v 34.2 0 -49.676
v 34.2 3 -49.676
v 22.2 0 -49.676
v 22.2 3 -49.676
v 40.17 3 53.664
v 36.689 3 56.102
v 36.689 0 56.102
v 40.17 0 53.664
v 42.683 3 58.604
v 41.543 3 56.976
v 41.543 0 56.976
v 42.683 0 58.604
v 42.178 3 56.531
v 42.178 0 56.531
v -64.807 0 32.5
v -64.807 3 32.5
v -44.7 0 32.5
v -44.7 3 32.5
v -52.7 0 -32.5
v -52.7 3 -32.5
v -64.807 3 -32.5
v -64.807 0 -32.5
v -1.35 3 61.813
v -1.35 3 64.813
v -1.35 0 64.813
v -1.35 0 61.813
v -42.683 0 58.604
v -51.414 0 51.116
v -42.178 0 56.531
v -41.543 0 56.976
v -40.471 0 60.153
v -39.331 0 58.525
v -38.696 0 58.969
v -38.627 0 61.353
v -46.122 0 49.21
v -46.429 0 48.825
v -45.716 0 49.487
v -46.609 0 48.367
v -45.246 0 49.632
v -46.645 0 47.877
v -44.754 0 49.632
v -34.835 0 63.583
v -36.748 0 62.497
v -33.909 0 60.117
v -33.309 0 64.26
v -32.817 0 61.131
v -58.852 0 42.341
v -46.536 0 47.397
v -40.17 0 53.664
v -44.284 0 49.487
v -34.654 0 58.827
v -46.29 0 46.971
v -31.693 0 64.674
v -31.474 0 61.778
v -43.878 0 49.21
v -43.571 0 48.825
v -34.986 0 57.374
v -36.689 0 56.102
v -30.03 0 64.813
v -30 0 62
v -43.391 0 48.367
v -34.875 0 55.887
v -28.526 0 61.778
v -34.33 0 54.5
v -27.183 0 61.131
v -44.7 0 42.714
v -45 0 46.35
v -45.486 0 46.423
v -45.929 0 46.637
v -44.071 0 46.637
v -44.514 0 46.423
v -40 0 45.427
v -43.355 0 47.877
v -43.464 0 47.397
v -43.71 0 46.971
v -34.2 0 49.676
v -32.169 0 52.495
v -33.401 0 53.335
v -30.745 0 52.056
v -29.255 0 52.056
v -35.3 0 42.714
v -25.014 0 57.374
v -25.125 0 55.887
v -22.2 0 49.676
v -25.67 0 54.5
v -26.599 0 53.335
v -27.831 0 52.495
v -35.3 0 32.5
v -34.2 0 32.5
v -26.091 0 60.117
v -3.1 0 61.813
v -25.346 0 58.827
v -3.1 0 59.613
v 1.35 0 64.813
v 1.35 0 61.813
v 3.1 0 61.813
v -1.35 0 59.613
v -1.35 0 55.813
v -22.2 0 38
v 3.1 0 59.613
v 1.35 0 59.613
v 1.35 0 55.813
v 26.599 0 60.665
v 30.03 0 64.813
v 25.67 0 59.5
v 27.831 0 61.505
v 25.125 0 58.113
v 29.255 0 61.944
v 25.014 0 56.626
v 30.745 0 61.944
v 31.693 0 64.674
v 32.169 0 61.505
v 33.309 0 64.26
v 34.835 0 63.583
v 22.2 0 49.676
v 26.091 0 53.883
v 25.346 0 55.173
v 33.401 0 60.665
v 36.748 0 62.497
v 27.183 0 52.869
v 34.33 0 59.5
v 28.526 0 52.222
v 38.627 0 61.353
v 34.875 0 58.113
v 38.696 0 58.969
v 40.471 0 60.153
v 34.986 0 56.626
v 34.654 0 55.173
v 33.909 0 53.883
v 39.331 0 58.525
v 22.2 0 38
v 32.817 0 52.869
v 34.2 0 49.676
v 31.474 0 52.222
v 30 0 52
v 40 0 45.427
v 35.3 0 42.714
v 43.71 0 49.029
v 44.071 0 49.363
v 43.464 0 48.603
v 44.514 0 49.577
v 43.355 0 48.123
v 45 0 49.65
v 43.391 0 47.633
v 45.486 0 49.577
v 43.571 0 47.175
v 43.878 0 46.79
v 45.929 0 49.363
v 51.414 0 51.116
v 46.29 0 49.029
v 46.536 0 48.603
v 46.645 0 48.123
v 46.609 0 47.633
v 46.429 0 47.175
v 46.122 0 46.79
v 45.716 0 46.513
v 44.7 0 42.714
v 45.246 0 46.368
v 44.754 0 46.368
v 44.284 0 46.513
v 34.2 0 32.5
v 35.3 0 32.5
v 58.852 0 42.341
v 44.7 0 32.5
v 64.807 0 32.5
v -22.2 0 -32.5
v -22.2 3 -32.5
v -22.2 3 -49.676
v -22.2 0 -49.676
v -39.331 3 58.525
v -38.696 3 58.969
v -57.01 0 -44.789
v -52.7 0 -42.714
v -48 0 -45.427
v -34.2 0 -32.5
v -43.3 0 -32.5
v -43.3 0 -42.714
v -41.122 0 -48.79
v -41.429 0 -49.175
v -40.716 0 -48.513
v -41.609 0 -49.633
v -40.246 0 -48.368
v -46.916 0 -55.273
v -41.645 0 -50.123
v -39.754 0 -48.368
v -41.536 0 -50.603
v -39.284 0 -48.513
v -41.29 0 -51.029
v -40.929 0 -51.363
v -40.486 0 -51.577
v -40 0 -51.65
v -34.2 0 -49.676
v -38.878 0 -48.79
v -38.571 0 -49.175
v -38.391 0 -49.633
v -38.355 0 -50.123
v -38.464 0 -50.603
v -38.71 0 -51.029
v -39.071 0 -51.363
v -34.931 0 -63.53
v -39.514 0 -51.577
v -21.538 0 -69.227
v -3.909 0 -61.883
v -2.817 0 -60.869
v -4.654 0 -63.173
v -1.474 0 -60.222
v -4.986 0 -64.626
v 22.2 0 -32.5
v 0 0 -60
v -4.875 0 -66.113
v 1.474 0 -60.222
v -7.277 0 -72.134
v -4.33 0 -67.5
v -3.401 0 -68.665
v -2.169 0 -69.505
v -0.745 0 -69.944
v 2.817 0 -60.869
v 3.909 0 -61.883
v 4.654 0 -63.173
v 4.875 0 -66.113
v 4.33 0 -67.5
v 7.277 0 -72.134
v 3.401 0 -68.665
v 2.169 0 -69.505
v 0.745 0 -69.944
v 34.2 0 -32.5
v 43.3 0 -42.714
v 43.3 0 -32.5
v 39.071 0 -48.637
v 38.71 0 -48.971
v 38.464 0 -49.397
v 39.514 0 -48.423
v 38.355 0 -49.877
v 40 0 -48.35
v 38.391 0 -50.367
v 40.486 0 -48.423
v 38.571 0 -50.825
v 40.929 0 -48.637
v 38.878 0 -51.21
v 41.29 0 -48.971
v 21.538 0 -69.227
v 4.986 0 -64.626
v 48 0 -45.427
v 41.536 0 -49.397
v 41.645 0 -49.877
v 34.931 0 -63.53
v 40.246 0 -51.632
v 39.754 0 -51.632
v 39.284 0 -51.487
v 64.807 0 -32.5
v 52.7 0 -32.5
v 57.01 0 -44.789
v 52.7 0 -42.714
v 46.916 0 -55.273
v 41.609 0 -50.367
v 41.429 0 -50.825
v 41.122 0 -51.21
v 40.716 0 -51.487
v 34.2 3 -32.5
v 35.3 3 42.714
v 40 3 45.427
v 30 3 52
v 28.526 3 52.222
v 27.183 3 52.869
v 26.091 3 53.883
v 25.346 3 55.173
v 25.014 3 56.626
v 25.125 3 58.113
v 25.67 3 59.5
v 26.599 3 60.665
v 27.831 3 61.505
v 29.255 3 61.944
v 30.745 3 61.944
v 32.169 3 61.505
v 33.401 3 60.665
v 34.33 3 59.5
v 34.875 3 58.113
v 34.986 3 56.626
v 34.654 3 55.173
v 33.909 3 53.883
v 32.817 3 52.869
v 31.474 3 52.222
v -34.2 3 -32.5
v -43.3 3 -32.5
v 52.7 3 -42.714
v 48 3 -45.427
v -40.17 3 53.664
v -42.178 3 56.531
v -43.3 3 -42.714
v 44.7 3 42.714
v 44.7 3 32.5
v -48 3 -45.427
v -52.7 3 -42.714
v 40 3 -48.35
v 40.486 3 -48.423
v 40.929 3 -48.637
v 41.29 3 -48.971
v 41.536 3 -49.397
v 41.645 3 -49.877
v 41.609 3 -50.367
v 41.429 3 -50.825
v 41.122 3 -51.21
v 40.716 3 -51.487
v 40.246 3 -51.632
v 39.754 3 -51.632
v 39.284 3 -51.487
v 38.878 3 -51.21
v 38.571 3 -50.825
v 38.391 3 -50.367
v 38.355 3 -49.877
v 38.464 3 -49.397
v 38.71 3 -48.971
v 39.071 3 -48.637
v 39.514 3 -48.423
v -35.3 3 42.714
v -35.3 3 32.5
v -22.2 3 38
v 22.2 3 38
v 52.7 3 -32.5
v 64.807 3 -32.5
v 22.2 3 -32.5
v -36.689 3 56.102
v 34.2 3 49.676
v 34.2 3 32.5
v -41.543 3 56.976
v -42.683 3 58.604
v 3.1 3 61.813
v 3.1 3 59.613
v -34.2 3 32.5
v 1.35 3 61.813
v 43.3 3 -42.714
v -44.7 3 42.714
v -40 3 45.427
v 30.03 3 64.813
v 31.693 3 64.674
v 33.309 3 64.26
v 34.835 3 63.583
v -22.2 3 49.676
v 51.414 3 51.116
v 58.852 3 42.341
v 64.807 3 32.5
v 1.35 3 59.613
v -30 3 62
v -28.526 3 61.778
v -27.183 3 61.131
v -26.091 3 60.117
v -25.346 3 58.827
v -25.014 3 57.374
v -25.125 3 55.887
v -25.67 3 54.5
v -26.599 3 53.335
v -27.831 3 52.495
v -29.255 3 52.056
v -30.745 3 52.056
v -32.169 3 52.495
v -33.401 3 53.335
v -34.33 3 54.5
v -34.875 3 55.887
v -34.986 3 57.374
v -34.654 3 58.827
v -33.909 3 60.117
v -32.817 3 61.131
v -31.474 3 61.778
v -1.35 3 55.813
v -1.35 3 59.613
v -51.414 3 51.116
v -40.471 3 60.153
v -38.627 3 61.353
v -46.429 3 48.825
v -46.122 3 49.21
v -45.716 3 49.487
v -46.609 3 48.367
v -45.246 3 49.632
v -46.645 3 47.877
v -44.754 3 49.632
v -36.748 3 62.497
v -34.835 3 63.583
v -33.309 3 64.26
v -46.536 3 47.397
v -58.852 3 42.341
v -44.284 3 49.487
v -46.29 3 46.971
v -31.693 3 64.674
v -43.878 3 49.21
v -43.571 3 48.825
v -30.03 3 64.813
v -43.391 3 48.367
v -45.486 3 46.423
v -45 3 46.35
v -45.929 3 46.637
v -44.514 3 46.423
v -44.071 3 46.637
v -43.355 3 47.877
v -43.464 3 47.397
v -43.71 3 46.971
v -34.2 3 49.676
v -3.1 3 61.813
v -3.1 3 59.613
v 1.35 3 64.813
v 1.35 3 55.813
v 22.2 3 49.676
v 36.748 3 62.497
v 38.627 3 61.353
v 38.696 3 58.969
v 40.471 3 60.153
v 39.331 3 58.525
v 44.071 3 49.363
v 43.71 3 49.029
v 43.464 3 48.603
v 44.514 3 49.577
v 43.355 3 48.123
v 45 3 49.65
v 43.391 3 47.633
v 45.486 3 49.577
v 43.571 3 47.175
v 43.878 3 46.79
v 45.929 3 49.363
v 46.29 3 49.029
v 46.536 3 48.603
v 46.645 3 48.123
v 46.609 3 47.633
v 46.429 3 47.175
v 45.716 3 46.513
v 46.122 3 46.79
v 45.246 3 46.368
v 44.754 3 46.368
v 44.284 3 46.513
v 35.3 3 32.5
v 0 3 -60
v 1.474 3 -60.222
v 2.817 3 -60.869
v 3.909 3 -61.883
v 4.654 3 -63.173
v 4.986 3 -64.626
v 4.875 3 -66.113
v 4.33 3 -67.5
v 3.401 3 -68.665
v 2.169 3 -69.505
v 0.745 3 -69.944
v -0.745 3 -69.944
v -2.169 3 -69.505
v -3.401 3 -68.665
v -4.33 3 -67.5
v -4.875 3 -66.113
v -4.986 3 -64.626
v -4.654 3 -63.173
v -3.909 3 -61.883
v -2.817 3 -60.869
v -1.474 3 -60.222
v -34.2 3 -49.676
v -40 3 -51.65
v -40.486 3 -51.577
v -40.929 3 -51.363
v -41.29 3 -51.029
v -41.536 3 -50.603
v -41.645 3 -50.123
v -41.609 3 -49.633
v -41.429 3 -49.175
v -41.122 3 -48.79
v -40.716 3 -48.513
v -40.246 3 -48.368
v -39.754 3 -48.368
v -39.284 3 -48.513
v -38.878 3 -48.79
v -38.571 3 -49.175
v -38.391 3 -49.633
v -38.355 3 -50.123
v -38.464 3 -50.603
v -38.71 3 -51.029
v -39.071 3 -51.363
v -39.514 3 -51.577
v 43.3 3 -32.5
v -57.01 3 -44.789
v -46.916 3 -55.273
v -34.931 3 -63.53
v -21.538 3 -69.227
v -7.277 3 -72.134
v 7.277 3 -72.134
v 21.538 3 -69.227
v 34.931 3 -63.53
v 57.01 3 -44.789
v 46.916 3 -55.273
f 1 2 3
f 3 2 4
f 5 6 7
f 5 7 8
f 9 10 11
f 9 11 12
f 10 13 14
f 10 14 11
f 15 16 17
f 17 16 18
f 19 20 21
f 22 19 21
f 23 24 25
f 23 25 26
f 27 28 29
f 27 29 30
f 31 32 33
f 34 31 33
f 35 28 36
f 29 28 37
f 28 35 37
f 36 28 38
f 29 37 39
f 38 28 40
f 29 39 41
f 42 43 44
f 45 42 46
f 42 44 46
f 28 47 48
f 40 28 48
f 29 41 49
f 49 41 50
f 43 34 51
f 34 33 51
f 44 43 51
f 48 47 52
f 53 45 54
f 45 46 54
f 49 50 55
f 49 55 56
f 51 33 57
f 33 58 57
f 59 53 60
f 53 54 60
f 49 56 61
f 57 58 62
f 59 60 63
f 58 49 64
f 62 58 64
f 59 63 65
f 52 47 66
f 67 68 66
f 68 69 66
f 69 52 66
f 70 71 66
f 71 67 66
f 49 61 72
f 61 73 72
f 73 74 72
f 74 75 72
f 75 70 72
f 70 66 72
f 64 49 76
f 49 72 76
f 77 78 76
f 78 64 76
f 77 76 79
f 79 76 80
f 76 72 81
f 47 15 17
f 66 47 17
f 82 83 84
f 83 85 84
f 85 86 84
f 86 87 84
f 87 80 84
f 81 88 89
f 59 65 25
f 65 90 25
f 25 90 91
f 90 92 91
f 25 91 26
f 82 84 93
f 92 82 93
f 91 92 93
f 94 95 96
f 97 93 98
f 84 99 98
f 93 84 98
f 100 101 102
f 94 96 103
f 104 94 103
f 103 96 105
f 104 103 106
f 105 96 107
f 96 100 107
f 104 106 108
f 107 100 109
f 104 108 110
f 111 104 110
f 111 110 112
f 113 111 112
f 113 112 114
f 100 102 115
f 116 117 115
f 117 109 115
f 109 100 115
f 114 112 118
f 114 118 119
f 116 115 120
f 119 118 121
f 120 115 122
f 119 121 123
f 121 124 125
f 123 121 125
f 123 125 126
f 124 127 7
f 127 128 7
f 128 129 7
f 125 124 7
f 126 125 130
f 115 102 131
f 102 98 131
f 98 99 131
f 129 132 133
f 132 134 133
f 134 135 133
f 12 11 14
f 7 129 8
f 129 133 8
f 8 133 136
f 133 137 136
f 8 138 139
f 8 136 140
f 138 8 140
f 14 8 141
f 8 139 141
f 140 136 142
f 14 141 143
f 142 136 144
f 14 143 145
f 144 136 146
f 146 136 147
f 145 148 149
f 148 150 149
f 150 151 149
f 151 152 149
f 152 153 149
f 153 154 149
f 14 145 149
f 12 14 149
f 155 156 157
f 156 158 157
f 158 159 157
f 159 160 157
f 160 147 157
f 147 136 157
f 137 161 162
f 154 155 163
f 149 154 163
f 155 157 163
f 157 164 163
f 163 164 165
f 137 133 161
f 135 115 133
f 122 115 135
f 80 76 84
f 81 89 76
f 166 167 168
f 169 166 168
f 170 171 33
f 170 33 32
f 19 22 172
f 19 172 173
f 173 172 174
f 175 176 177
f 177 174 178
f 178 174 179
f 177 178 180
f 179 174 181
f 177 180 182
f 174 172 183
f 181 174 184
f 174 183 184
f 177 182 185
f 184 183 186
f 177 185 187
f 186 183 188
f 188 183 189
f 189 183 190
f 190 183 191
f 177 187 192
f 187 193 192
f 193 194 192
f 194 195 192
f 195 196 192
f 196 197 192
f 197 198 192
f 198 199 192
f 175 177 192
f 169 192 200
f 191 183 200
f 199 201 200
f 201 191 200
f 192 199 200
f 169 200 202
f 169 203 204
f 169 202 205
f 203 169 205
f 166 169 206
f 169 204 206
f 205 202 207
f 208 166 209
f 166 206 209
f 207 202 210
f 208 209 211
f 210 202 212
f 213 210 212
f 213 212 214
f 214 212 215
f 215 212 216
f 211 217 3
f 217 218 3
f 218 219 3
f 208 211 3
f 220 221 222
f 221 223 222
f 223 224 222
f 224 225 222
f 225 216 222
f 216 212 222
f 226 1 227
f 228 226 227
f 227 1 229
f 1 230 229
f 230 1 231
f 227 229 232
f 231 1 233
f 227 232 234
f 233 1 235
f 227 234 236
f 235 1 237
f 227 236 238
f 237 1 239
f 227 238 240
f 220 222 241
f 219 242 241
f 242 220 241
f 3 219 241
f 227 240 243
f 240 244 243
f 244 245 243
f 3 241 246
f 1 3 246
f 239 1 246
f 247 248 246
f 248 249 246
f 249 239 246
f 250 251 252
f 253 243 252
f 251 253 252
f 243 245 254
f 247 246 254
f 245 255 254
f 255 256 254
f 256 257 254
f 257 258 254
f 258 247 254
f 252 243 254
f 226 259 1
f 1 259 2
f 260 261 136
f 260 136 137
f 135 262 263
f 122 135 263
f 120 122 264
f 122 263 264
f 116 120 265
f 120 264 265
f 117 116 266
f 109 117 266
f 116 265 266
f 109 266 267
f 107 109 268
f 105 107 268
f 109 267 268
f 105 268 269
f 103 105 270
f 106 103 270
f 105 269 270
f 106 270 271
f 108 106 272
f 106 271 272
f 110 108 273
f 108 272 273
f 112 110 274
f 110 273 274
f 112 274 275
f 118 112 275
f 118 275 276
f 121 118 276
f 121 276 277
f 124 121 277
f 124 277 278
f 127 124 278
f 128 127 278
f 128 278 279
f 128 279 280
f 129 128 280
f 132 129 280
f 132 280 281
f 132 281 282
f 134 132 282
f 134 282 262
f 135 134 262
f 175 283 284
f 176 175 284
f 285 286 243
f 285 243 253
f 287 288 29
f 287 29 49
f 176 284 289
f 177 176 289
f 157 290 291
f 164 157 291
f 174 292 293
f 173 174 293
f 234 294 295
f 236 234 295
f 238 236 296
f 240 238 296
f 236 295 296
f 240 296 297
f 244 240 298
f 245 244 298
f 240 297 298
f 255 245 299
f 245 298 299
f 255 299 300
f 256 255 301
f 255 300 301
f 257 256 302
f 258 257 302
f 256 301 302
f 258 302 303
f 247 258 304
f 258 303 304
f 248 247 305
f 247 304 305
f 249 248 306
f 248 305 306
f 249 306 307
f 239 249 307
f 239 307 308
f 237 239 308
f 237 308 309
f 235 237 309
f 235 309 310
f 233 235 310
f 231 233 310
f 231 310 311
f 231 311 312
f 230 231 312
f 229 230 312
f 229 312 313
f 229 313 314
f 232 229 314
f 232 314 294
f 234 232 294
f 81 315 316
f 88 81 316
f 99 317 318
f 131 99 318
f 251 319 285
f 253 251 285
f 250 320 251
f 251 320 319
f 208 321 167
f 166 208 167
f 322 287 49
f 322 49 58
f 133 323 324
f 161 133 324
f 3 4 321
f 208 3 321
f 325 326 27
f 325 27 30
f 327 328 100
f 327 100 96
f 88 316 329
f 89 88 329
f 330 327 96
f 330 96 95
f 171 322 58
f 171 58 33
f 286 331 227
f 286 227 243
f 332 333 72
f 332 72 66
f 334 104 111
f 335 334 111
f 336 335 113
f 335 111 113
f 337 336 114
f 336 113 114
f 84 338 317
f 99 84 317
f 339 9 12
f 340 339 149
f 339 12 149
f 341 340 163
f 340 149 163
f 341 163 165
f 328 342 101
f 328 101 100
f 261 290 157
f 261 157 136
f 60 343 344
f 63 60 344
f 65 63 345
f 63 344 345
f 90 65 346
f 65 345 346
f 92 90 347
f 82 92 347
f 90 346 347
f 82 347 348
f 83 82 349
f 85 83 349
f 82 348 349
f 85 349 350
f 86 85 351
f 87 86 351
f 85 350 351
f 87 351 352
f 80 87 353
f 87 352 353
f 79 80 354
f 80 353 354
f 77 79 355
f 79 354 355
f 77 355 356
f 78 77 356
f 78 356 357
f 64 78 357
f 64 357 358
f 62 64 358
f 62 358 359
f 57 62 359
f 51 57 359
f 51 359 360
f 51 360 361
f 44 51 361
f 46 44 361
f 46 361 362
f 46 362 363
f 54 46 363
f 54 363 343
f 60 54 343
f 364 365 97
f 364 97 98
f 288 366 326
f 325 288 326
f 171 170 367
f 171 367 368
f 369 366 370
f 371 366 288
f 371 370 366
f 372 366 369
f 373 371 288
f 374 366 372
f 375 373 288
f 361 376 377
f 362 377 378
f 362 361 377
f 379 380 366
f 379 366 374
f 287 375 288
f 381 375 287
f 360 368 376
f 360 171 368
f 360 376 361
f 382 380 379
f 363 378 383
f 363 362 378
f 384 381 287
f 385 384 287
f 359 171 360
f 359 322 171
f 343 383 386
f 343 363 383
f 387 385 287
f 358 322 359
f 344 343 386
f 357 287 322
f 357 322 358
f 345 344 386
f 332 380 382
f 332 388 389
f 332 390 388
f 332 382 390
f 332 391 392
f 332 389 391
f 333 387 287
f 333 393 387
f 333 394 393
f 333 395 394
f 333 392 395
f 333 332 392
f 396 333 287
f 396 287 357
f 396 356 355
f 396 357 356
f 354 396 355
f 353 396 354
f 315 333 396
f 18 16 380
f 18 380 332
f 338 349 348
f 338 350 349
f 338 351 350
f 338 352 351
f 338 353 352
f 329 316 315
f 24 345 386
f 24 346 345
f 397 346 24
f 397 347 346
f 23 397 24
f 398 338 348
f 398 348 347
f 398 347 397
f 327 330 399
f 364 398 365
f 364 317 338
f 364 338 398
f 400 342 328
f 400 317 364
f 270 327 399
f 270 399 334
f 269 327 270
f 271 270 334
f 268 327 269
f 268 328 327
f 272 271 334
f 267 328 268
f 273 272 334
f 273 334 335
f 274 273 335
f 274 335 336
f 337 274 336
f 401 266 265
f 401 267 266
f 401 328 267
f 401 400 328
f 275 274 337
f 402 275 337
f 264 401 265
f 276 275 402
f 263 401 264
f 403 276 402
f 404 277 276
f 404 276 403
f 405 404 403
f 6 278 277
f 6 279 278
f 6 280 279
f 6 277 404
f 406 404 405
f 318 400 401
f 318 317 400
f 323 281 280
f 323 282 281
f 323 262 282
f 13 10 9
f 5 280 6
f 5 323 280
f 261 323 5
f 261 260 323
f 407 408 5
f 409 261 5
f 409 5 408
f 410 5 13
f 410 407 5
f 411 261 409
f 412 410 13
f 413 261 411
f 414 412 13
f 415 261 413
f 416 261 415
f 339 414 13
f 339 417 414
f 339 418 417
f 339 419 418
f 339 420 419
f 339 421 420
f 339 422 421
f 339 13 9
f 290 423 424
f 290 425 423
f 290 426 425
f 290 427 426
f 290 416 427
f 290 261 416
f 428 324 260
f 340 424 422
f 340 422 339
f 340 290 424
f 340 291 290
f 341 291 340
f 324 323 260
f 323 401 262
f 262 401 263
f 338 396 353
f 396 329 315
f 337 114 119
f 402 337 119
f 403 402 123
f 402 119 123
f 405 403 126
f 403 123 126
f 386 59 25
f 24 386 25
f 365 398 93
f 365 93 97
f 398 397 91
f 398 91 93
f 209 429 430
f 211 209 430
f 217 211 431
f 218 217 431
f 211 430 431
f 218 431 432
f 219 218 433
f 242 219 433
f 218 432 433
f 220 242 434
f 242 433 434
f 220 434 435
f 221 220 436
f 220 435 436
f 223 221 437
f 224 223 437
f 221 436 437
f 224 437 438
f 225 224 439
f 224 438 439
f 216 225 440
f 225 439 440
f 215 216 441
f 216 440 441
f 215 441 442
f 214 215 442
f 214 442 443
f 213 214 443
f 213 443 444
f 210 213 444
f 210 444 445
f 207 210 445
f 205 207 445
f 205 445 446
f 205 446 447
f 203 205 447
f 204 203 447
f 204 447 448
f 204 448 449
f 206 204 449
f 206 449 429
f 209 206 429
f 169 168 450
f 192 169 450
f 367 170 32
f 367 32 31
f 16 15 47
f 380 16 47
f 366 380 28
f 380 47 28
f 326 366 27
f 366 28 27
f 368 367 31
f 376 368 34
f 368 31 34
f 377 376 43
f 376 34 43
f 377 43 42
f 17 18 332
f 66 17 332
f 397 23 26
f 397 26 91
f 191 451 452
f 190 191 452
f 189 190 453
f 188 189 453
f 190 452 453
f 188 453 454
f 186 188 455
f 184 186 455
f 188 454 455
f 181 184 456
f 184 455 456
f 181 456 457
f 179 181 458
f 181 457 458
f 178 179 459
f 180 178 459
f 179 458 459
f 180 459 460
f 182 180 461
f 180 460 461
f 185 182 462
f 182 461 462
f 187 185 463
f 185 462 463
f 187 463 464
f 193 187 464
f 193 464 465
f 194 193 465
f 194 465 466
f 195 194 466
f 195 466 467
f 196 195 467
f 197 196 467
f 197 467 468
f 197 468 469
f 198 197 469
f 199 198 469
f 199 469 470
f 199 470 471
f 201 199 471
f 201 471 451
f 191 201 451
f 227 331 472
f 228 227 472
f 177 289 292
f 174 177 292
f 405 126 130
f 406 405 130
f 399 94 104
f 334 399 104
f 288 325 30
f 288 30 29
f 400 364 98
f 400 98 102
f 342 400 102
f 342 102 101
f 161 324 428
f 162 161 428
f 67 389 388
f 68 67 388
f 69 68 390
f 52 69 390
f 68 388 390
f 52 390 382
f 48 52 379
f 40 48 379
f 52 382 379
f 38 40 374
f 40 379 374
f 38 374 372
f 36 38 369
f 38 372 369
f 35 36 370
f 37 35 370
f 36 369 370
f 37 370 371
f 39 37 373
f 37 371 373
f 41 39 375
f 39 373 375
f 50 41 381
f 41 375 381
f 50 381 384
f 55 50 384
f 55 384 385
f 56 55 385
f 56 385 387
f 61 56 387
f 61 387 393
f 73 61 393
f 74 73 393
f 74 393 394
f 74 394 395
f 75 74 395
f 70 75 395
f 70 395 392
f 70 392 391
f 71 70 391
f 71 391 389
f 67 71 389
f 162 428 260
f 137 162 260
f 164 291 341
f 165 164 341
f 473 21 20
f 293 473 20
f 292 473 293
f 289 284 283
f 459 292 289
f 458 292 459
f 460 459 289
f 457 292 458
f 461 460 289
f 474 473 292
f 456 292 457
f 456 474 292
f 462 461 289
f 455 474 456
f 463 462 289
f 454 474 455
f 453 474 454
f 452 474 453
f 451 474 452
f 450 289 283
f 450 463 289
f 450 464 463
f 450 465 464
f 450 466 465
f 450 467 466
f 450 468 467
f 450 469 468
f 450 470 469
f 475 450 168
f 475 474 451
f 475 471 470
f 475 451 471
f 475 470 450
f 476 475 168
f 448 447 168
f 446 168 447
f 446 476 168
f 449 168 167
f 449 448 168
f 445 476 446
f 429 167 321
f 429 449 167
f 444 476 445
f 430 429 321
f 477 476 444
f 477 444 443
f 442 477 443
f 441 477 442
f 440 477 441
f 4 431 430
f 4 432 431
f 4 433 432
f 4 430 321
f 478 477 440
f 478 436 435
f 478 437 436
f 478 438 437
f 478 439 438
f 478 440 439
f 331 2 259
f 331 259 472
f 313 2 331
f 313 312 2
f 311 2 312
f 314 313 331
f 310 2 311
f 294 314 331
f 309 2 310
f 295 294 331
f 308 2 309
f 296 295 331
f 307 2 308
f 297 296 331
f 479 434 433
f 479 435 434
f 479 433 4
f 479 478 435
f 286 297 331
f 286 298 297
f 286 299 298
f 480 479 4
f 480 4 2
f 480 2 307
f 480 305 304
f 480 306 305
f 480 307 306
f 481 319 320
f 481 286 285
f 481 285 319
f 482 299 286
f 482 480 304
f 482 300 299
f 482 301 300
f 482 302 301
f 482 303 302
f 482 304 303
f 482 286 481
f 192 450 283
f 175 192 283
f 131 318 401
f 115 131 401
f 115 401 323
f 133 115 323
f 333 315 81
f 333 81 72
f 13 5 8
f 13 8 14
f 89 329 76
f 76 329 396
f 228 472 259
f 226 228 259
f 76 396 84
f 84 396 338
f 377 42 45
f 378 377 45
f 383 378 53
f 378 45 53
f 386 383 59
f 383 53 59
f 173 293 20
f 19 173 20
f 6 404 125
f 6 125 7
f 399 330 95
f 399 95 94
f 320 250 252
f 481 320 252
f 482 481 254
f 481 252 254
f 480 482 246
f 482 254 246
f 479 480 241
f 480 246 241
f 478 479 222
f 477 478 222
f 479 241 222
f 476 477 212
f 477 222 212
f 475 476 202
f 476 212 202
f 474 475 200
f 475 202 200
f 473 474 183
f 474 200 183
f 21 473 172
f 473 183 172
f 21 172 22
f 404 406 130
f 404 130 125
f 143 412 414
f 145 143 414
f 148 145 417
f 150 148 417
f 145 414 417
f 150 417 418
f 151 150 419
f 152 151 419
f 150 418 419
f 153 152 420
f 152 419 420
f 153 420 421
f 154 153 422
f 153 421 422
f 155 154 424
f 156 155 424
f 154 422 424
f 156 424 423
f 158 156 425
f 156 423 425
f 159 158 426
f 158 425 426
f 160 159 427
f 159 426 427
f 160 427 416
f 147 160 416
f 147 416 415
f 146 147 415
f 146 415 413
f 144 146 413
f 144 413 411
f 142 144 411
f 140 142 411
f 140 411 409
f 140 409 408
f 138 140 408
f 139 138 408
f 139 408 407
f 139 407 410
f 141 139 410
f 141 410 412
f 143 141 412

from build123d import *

# Parameters (mm, degrees)
BOSS_EXTRUDE1_DEPTH = 3
CUT_EXTRUDE1_DEPTH  = 103.574363269
CUT_EXTRUDE2_DEPTH  = 103.574363269
SKETCH4_R           = 5
CUT_EXTRUDE3_DEPTH  = 98.289516393
CUT_EXTRUDE4_DEPTH  = 98.289516393
SKETCH7_R           = 5
CUT_EXTRUDE6_DEPTH  = 98.289516393
CUT_EXTRUDE7_DEPTH  = 98.289516393
SKETCH9_R           = 1.65
CUT_EXTRUDE8_DEPTH  = 98.289516393
CUT_EXTRUDE9_DEPTH  = 98.289516393


with BuildPart() as part:
    # Sketch1 → Boss-Extrude1 (new body)
    with BuildSketch(Plane(origin=(0, 0, 0), x_dir=(1, 0, 0), z_dir=(0, 1, 0))):
        with BuildLine():
            Line((-30.029977361, -64.812867647), (30.029977361, -64.812867647))
            ThreePointArc((30.029977361, -64.812867647), (32.509837414, -64.500503794), (34.834773739, -63.582926471))
            ThreePointArc((34.834773739, -63.582926471), (0, 72.5), (-34.834773739, -63.582926471))
            ThreePointArc((-34.834773739, -63.582926471), (-32.509837414, -64.500503794), (-30.029977361, -64.812867647))
        make_face()
    extrude(amount=BOSS_EXTRUDE1_DEPTH)

    # Sketch2 → Cut-Extrude1 (cut, through all)
    with BuildSketch(Plane(origin=(0, 3, 0), x_dir=(1, 0, 0), z_dir=(0, 1, 0))):
        Polygon((-34.2, -49.675685802), (-22.2, -49.675685802), (-22.2, -38), (22.2, -38), (22.2, -49.675685802), (34.2, -49.675685802), (34.2, 49.675685802), (22.2, 49.675685802), (22.2, 32.5), (19, 32.5), (19, 28.2), (-19, 28.2), (-19, 32.5), (-22.2, 32.5), (-22.2, 49.675685802), (-34.2, 49.675685802), align=None)
    extrude(amount=-CUT_EXTRUDE1_DEPTH, mode=Mode.SUBTRACT)

    # Sketch3 → Cut-Extrude2 (cut, through all)
    with BuildSketch(Plane(origin=(0, 3, 0), x_dir=(1, 0, 0), z_dir=(0, 1, 0))):
        Polygon((34.2, -32.5), (-34.2, -32.5), (-72.5, -32.5), (-72.5, 32.5), (-34.2, 32.5), (34.2, 32.5), (72.5, 32.5), (72.5, -32.5), align=None)
    extrude(amount=-CUT_EXTRUDE2_DEPTH, mode=Mode.SUBTRACT)


with BuildPart() as cut_extrude2_piece_1:
    # of the separate pieces the step leaves, piece 1, a body of its own (cut_extrude2_pieces)
    add(part.part.solids().sort_by_distance((64.807406984, 0, -32.5))[0])


with BuildPart() as cut_extrude2_piece_2:
    # of the separate pieces the step leaves, piece 2, a body of its own (cut_extrude2_pieces)
    add(part.part.solids().sort_by_distance((-34.834773739, 0, 63.582926471))[0])

    # Sketch4 → Cut-Extrude3 (cut, through all)
    with BuildSketch(Plane(origin=(0, 3, 0), x_dir=(1, 0, 0), z_dir=(0, 1, 0))):
        with Locations(Location((30, -57, 0), (0, 0, 90))):
            Circle(SKETCH4_R)
        with Locations(Location((-30, -57, 0), (0, 0, 270))):
            Circle(SKETCH4_R)
    extrude(amount=-CUT_EXTRUDE3_DEPTH, mode=Mode.SUBTRACT)


with BuildPart() as cut_extrude4_tool:
    # Sketch5 → Cut-Extrude4 (new, through all)
    with BuildSketch(Plane(origin=(0, 3, 0), x_dir=(1, 0, 0), z_dir=(0, 1, 0))):
        Polygon((-52.7, 37.286453735), (-52.7, 32.5), (-43.3, 32.5), (-43.3, 37.286453735), (-43.3, 42.713546265), (-48, 45.42709253), (-52.7, 42.713546265), align=None)
        Polygon((-44.7, -37.286453735), (-44.7, -32.5), (-35.3, -32.5), (-35.3, -37.286453735), (-35.3, -42.713546265), (-40, -45.42709253), (-44.7, -42.713546265), align=None)
        Polygon((35.3, -32.5), (44.7, -32.5), (44.7, -37.286453735), (44.7, -42.713546265), (40, -45.42709253), (35.3, -42.713546265), (35.3, -37.286453735), align=None)
        Polygon((43.3, 37.286453735), (43.3, 42.713546265), (48, 45.42709253), (52.7, 42.713546265), (52.7, 37.286453735), (52.7, 32.5), (43.3, 32.5), align=None)
    extrude(amount=-CUT_EXTRUDE4_DEPTH)


with BuildPart() as cut_extrude2_piece_1_1:
    add(cut_extrude2_piece_1.part)

    # Cut-Extrude4: cut by cut_extrude4_tool
    add(cut_extrude4_tool.part, mode=Mode.SUBTRACT)

    # Sketch7 → Cut-Extrude6 (cut, through all)
    with BuildSketch(Plane(origin=(0, 3, 0), x_dir=(1, 0, 0), z_dir=(0, 1, 0))):
        with Locations(Location((0, 65, 0), (0, 0, 270))):
            Circle(SKETCH7_R)
    extrude(amount=-CUT_EXTRUDE6_DEPTH, mode=Mode.SUBTRACT)


with BuildPart() as cut_extrude2_piece_2_1:
    add(cut_extrude2_piece_2.part)

    # Cut-Extrude4: cut by cut_extrude4_tool
    add(cut_extrude4_tool.part, mode=Mode.SUBTRACT)

    # Sketch8 → Cut-Extrude7 (cut, through all)
    with BuildSketch(Plane(origin=(0, 3, 0), x_dir=(1, 0, 0), z_dir=(0, 1, 0))):
        Polygon((-1.35, -64.812867647), (-1.35, -61.812867647), (-3.1, -61.812867647), (-3.1, -59.612867647), (-1.35, -59.612867647), (-1.35, -55.812867647), (1.35, -55.812867647), (1.35, -59.612867647), (3.1, -59.612867647), (3.1, -61.812867647), (1.35, -61.812867647), (1.35, -64.812867647), align=None)
    extrude(amount=-CUT_EXTRUDE7_DEPTH, mode=Mode.SUBTRACT)


with BuildPart() as cut_extrude8_tool:
    # Sketch9 → Cut-Extrude8 (new, through all)
    with BuildSketch(Plane(origin=(0, 3, 0), x_dir=(1, 0, 0), z_dir=(0, 1, 0))):
        with Locations(Location((45, -48, 0), (0, 0, 270))):
            Circle(SKETCH9_R)
        with Locations(Location((-45, -48, 0), (0, 0, 90))):
            Circle(SKETCH9_R)
        with Locations(Location((40, 50, 0), (0, 0, 270))):
            Circle(SKETCH9_R)
        with Locations(Location((-40, 50, 0), (0, 0, 90))):
            Circle(SKETCH9_R)
    extrude(amount=-CUT_EXTRUDE8_DEPTH)


with BuildPart() as cut_extrude2_piece_1_2:
    add(cut_extrude2_piece_1_1.part)

    # Cut-Extrude8: cut by cut_extrude8_tool
    add(cut_extrude8_tool.part, mode=Mode.SUBTRACT)


with BuildPart() as cut_extrude2_piece_2_2:
    add(cut_extrude2_piece_2_1.part)

    # Cut-Extrude8: cut by cut_extrude8_tool
    add(cut_extrude8_tool.part, mode=Mode.SUBTRACT)

    # Sketch10 → Cut-Extrude9 (cut, through all)
    with BuildSketch(Plane(origin=(0, 3, 0), x_dir=(1, 0, 0), z_dir=(0, 1, 0))):
        Polygon((36.688923141, -56.102036895), (40.17031933, -53.66433704), (42.177836857, -56.531369195), (41.542994023, -56.975890933), (42.690146895, -58.614195022), (40.478436376, -60.1628514), (39.331283503, -58.524547311), (38.696440669, -58.96906905), align=None)
        Polygon((-41.542994023, -56.975890933), (-42.177836857, -56.531369195), (-40.17031933, -53.66433704), (-36.688923141, -56.102036895), (-38.696440669, -58.96906905), (-39.331283503, -58.524547311), (-40.478436376, -60.1628514), (-42.690146895, -58.614195022), align=None)
    extrude(amount=-CUT_EXTRUDE9_DEPTH, mode=Mode.SUBTRACT)


solid = Compound([cut_extrude2_piece_1_2.part, cut_extrude2_piece_2_2.part])
